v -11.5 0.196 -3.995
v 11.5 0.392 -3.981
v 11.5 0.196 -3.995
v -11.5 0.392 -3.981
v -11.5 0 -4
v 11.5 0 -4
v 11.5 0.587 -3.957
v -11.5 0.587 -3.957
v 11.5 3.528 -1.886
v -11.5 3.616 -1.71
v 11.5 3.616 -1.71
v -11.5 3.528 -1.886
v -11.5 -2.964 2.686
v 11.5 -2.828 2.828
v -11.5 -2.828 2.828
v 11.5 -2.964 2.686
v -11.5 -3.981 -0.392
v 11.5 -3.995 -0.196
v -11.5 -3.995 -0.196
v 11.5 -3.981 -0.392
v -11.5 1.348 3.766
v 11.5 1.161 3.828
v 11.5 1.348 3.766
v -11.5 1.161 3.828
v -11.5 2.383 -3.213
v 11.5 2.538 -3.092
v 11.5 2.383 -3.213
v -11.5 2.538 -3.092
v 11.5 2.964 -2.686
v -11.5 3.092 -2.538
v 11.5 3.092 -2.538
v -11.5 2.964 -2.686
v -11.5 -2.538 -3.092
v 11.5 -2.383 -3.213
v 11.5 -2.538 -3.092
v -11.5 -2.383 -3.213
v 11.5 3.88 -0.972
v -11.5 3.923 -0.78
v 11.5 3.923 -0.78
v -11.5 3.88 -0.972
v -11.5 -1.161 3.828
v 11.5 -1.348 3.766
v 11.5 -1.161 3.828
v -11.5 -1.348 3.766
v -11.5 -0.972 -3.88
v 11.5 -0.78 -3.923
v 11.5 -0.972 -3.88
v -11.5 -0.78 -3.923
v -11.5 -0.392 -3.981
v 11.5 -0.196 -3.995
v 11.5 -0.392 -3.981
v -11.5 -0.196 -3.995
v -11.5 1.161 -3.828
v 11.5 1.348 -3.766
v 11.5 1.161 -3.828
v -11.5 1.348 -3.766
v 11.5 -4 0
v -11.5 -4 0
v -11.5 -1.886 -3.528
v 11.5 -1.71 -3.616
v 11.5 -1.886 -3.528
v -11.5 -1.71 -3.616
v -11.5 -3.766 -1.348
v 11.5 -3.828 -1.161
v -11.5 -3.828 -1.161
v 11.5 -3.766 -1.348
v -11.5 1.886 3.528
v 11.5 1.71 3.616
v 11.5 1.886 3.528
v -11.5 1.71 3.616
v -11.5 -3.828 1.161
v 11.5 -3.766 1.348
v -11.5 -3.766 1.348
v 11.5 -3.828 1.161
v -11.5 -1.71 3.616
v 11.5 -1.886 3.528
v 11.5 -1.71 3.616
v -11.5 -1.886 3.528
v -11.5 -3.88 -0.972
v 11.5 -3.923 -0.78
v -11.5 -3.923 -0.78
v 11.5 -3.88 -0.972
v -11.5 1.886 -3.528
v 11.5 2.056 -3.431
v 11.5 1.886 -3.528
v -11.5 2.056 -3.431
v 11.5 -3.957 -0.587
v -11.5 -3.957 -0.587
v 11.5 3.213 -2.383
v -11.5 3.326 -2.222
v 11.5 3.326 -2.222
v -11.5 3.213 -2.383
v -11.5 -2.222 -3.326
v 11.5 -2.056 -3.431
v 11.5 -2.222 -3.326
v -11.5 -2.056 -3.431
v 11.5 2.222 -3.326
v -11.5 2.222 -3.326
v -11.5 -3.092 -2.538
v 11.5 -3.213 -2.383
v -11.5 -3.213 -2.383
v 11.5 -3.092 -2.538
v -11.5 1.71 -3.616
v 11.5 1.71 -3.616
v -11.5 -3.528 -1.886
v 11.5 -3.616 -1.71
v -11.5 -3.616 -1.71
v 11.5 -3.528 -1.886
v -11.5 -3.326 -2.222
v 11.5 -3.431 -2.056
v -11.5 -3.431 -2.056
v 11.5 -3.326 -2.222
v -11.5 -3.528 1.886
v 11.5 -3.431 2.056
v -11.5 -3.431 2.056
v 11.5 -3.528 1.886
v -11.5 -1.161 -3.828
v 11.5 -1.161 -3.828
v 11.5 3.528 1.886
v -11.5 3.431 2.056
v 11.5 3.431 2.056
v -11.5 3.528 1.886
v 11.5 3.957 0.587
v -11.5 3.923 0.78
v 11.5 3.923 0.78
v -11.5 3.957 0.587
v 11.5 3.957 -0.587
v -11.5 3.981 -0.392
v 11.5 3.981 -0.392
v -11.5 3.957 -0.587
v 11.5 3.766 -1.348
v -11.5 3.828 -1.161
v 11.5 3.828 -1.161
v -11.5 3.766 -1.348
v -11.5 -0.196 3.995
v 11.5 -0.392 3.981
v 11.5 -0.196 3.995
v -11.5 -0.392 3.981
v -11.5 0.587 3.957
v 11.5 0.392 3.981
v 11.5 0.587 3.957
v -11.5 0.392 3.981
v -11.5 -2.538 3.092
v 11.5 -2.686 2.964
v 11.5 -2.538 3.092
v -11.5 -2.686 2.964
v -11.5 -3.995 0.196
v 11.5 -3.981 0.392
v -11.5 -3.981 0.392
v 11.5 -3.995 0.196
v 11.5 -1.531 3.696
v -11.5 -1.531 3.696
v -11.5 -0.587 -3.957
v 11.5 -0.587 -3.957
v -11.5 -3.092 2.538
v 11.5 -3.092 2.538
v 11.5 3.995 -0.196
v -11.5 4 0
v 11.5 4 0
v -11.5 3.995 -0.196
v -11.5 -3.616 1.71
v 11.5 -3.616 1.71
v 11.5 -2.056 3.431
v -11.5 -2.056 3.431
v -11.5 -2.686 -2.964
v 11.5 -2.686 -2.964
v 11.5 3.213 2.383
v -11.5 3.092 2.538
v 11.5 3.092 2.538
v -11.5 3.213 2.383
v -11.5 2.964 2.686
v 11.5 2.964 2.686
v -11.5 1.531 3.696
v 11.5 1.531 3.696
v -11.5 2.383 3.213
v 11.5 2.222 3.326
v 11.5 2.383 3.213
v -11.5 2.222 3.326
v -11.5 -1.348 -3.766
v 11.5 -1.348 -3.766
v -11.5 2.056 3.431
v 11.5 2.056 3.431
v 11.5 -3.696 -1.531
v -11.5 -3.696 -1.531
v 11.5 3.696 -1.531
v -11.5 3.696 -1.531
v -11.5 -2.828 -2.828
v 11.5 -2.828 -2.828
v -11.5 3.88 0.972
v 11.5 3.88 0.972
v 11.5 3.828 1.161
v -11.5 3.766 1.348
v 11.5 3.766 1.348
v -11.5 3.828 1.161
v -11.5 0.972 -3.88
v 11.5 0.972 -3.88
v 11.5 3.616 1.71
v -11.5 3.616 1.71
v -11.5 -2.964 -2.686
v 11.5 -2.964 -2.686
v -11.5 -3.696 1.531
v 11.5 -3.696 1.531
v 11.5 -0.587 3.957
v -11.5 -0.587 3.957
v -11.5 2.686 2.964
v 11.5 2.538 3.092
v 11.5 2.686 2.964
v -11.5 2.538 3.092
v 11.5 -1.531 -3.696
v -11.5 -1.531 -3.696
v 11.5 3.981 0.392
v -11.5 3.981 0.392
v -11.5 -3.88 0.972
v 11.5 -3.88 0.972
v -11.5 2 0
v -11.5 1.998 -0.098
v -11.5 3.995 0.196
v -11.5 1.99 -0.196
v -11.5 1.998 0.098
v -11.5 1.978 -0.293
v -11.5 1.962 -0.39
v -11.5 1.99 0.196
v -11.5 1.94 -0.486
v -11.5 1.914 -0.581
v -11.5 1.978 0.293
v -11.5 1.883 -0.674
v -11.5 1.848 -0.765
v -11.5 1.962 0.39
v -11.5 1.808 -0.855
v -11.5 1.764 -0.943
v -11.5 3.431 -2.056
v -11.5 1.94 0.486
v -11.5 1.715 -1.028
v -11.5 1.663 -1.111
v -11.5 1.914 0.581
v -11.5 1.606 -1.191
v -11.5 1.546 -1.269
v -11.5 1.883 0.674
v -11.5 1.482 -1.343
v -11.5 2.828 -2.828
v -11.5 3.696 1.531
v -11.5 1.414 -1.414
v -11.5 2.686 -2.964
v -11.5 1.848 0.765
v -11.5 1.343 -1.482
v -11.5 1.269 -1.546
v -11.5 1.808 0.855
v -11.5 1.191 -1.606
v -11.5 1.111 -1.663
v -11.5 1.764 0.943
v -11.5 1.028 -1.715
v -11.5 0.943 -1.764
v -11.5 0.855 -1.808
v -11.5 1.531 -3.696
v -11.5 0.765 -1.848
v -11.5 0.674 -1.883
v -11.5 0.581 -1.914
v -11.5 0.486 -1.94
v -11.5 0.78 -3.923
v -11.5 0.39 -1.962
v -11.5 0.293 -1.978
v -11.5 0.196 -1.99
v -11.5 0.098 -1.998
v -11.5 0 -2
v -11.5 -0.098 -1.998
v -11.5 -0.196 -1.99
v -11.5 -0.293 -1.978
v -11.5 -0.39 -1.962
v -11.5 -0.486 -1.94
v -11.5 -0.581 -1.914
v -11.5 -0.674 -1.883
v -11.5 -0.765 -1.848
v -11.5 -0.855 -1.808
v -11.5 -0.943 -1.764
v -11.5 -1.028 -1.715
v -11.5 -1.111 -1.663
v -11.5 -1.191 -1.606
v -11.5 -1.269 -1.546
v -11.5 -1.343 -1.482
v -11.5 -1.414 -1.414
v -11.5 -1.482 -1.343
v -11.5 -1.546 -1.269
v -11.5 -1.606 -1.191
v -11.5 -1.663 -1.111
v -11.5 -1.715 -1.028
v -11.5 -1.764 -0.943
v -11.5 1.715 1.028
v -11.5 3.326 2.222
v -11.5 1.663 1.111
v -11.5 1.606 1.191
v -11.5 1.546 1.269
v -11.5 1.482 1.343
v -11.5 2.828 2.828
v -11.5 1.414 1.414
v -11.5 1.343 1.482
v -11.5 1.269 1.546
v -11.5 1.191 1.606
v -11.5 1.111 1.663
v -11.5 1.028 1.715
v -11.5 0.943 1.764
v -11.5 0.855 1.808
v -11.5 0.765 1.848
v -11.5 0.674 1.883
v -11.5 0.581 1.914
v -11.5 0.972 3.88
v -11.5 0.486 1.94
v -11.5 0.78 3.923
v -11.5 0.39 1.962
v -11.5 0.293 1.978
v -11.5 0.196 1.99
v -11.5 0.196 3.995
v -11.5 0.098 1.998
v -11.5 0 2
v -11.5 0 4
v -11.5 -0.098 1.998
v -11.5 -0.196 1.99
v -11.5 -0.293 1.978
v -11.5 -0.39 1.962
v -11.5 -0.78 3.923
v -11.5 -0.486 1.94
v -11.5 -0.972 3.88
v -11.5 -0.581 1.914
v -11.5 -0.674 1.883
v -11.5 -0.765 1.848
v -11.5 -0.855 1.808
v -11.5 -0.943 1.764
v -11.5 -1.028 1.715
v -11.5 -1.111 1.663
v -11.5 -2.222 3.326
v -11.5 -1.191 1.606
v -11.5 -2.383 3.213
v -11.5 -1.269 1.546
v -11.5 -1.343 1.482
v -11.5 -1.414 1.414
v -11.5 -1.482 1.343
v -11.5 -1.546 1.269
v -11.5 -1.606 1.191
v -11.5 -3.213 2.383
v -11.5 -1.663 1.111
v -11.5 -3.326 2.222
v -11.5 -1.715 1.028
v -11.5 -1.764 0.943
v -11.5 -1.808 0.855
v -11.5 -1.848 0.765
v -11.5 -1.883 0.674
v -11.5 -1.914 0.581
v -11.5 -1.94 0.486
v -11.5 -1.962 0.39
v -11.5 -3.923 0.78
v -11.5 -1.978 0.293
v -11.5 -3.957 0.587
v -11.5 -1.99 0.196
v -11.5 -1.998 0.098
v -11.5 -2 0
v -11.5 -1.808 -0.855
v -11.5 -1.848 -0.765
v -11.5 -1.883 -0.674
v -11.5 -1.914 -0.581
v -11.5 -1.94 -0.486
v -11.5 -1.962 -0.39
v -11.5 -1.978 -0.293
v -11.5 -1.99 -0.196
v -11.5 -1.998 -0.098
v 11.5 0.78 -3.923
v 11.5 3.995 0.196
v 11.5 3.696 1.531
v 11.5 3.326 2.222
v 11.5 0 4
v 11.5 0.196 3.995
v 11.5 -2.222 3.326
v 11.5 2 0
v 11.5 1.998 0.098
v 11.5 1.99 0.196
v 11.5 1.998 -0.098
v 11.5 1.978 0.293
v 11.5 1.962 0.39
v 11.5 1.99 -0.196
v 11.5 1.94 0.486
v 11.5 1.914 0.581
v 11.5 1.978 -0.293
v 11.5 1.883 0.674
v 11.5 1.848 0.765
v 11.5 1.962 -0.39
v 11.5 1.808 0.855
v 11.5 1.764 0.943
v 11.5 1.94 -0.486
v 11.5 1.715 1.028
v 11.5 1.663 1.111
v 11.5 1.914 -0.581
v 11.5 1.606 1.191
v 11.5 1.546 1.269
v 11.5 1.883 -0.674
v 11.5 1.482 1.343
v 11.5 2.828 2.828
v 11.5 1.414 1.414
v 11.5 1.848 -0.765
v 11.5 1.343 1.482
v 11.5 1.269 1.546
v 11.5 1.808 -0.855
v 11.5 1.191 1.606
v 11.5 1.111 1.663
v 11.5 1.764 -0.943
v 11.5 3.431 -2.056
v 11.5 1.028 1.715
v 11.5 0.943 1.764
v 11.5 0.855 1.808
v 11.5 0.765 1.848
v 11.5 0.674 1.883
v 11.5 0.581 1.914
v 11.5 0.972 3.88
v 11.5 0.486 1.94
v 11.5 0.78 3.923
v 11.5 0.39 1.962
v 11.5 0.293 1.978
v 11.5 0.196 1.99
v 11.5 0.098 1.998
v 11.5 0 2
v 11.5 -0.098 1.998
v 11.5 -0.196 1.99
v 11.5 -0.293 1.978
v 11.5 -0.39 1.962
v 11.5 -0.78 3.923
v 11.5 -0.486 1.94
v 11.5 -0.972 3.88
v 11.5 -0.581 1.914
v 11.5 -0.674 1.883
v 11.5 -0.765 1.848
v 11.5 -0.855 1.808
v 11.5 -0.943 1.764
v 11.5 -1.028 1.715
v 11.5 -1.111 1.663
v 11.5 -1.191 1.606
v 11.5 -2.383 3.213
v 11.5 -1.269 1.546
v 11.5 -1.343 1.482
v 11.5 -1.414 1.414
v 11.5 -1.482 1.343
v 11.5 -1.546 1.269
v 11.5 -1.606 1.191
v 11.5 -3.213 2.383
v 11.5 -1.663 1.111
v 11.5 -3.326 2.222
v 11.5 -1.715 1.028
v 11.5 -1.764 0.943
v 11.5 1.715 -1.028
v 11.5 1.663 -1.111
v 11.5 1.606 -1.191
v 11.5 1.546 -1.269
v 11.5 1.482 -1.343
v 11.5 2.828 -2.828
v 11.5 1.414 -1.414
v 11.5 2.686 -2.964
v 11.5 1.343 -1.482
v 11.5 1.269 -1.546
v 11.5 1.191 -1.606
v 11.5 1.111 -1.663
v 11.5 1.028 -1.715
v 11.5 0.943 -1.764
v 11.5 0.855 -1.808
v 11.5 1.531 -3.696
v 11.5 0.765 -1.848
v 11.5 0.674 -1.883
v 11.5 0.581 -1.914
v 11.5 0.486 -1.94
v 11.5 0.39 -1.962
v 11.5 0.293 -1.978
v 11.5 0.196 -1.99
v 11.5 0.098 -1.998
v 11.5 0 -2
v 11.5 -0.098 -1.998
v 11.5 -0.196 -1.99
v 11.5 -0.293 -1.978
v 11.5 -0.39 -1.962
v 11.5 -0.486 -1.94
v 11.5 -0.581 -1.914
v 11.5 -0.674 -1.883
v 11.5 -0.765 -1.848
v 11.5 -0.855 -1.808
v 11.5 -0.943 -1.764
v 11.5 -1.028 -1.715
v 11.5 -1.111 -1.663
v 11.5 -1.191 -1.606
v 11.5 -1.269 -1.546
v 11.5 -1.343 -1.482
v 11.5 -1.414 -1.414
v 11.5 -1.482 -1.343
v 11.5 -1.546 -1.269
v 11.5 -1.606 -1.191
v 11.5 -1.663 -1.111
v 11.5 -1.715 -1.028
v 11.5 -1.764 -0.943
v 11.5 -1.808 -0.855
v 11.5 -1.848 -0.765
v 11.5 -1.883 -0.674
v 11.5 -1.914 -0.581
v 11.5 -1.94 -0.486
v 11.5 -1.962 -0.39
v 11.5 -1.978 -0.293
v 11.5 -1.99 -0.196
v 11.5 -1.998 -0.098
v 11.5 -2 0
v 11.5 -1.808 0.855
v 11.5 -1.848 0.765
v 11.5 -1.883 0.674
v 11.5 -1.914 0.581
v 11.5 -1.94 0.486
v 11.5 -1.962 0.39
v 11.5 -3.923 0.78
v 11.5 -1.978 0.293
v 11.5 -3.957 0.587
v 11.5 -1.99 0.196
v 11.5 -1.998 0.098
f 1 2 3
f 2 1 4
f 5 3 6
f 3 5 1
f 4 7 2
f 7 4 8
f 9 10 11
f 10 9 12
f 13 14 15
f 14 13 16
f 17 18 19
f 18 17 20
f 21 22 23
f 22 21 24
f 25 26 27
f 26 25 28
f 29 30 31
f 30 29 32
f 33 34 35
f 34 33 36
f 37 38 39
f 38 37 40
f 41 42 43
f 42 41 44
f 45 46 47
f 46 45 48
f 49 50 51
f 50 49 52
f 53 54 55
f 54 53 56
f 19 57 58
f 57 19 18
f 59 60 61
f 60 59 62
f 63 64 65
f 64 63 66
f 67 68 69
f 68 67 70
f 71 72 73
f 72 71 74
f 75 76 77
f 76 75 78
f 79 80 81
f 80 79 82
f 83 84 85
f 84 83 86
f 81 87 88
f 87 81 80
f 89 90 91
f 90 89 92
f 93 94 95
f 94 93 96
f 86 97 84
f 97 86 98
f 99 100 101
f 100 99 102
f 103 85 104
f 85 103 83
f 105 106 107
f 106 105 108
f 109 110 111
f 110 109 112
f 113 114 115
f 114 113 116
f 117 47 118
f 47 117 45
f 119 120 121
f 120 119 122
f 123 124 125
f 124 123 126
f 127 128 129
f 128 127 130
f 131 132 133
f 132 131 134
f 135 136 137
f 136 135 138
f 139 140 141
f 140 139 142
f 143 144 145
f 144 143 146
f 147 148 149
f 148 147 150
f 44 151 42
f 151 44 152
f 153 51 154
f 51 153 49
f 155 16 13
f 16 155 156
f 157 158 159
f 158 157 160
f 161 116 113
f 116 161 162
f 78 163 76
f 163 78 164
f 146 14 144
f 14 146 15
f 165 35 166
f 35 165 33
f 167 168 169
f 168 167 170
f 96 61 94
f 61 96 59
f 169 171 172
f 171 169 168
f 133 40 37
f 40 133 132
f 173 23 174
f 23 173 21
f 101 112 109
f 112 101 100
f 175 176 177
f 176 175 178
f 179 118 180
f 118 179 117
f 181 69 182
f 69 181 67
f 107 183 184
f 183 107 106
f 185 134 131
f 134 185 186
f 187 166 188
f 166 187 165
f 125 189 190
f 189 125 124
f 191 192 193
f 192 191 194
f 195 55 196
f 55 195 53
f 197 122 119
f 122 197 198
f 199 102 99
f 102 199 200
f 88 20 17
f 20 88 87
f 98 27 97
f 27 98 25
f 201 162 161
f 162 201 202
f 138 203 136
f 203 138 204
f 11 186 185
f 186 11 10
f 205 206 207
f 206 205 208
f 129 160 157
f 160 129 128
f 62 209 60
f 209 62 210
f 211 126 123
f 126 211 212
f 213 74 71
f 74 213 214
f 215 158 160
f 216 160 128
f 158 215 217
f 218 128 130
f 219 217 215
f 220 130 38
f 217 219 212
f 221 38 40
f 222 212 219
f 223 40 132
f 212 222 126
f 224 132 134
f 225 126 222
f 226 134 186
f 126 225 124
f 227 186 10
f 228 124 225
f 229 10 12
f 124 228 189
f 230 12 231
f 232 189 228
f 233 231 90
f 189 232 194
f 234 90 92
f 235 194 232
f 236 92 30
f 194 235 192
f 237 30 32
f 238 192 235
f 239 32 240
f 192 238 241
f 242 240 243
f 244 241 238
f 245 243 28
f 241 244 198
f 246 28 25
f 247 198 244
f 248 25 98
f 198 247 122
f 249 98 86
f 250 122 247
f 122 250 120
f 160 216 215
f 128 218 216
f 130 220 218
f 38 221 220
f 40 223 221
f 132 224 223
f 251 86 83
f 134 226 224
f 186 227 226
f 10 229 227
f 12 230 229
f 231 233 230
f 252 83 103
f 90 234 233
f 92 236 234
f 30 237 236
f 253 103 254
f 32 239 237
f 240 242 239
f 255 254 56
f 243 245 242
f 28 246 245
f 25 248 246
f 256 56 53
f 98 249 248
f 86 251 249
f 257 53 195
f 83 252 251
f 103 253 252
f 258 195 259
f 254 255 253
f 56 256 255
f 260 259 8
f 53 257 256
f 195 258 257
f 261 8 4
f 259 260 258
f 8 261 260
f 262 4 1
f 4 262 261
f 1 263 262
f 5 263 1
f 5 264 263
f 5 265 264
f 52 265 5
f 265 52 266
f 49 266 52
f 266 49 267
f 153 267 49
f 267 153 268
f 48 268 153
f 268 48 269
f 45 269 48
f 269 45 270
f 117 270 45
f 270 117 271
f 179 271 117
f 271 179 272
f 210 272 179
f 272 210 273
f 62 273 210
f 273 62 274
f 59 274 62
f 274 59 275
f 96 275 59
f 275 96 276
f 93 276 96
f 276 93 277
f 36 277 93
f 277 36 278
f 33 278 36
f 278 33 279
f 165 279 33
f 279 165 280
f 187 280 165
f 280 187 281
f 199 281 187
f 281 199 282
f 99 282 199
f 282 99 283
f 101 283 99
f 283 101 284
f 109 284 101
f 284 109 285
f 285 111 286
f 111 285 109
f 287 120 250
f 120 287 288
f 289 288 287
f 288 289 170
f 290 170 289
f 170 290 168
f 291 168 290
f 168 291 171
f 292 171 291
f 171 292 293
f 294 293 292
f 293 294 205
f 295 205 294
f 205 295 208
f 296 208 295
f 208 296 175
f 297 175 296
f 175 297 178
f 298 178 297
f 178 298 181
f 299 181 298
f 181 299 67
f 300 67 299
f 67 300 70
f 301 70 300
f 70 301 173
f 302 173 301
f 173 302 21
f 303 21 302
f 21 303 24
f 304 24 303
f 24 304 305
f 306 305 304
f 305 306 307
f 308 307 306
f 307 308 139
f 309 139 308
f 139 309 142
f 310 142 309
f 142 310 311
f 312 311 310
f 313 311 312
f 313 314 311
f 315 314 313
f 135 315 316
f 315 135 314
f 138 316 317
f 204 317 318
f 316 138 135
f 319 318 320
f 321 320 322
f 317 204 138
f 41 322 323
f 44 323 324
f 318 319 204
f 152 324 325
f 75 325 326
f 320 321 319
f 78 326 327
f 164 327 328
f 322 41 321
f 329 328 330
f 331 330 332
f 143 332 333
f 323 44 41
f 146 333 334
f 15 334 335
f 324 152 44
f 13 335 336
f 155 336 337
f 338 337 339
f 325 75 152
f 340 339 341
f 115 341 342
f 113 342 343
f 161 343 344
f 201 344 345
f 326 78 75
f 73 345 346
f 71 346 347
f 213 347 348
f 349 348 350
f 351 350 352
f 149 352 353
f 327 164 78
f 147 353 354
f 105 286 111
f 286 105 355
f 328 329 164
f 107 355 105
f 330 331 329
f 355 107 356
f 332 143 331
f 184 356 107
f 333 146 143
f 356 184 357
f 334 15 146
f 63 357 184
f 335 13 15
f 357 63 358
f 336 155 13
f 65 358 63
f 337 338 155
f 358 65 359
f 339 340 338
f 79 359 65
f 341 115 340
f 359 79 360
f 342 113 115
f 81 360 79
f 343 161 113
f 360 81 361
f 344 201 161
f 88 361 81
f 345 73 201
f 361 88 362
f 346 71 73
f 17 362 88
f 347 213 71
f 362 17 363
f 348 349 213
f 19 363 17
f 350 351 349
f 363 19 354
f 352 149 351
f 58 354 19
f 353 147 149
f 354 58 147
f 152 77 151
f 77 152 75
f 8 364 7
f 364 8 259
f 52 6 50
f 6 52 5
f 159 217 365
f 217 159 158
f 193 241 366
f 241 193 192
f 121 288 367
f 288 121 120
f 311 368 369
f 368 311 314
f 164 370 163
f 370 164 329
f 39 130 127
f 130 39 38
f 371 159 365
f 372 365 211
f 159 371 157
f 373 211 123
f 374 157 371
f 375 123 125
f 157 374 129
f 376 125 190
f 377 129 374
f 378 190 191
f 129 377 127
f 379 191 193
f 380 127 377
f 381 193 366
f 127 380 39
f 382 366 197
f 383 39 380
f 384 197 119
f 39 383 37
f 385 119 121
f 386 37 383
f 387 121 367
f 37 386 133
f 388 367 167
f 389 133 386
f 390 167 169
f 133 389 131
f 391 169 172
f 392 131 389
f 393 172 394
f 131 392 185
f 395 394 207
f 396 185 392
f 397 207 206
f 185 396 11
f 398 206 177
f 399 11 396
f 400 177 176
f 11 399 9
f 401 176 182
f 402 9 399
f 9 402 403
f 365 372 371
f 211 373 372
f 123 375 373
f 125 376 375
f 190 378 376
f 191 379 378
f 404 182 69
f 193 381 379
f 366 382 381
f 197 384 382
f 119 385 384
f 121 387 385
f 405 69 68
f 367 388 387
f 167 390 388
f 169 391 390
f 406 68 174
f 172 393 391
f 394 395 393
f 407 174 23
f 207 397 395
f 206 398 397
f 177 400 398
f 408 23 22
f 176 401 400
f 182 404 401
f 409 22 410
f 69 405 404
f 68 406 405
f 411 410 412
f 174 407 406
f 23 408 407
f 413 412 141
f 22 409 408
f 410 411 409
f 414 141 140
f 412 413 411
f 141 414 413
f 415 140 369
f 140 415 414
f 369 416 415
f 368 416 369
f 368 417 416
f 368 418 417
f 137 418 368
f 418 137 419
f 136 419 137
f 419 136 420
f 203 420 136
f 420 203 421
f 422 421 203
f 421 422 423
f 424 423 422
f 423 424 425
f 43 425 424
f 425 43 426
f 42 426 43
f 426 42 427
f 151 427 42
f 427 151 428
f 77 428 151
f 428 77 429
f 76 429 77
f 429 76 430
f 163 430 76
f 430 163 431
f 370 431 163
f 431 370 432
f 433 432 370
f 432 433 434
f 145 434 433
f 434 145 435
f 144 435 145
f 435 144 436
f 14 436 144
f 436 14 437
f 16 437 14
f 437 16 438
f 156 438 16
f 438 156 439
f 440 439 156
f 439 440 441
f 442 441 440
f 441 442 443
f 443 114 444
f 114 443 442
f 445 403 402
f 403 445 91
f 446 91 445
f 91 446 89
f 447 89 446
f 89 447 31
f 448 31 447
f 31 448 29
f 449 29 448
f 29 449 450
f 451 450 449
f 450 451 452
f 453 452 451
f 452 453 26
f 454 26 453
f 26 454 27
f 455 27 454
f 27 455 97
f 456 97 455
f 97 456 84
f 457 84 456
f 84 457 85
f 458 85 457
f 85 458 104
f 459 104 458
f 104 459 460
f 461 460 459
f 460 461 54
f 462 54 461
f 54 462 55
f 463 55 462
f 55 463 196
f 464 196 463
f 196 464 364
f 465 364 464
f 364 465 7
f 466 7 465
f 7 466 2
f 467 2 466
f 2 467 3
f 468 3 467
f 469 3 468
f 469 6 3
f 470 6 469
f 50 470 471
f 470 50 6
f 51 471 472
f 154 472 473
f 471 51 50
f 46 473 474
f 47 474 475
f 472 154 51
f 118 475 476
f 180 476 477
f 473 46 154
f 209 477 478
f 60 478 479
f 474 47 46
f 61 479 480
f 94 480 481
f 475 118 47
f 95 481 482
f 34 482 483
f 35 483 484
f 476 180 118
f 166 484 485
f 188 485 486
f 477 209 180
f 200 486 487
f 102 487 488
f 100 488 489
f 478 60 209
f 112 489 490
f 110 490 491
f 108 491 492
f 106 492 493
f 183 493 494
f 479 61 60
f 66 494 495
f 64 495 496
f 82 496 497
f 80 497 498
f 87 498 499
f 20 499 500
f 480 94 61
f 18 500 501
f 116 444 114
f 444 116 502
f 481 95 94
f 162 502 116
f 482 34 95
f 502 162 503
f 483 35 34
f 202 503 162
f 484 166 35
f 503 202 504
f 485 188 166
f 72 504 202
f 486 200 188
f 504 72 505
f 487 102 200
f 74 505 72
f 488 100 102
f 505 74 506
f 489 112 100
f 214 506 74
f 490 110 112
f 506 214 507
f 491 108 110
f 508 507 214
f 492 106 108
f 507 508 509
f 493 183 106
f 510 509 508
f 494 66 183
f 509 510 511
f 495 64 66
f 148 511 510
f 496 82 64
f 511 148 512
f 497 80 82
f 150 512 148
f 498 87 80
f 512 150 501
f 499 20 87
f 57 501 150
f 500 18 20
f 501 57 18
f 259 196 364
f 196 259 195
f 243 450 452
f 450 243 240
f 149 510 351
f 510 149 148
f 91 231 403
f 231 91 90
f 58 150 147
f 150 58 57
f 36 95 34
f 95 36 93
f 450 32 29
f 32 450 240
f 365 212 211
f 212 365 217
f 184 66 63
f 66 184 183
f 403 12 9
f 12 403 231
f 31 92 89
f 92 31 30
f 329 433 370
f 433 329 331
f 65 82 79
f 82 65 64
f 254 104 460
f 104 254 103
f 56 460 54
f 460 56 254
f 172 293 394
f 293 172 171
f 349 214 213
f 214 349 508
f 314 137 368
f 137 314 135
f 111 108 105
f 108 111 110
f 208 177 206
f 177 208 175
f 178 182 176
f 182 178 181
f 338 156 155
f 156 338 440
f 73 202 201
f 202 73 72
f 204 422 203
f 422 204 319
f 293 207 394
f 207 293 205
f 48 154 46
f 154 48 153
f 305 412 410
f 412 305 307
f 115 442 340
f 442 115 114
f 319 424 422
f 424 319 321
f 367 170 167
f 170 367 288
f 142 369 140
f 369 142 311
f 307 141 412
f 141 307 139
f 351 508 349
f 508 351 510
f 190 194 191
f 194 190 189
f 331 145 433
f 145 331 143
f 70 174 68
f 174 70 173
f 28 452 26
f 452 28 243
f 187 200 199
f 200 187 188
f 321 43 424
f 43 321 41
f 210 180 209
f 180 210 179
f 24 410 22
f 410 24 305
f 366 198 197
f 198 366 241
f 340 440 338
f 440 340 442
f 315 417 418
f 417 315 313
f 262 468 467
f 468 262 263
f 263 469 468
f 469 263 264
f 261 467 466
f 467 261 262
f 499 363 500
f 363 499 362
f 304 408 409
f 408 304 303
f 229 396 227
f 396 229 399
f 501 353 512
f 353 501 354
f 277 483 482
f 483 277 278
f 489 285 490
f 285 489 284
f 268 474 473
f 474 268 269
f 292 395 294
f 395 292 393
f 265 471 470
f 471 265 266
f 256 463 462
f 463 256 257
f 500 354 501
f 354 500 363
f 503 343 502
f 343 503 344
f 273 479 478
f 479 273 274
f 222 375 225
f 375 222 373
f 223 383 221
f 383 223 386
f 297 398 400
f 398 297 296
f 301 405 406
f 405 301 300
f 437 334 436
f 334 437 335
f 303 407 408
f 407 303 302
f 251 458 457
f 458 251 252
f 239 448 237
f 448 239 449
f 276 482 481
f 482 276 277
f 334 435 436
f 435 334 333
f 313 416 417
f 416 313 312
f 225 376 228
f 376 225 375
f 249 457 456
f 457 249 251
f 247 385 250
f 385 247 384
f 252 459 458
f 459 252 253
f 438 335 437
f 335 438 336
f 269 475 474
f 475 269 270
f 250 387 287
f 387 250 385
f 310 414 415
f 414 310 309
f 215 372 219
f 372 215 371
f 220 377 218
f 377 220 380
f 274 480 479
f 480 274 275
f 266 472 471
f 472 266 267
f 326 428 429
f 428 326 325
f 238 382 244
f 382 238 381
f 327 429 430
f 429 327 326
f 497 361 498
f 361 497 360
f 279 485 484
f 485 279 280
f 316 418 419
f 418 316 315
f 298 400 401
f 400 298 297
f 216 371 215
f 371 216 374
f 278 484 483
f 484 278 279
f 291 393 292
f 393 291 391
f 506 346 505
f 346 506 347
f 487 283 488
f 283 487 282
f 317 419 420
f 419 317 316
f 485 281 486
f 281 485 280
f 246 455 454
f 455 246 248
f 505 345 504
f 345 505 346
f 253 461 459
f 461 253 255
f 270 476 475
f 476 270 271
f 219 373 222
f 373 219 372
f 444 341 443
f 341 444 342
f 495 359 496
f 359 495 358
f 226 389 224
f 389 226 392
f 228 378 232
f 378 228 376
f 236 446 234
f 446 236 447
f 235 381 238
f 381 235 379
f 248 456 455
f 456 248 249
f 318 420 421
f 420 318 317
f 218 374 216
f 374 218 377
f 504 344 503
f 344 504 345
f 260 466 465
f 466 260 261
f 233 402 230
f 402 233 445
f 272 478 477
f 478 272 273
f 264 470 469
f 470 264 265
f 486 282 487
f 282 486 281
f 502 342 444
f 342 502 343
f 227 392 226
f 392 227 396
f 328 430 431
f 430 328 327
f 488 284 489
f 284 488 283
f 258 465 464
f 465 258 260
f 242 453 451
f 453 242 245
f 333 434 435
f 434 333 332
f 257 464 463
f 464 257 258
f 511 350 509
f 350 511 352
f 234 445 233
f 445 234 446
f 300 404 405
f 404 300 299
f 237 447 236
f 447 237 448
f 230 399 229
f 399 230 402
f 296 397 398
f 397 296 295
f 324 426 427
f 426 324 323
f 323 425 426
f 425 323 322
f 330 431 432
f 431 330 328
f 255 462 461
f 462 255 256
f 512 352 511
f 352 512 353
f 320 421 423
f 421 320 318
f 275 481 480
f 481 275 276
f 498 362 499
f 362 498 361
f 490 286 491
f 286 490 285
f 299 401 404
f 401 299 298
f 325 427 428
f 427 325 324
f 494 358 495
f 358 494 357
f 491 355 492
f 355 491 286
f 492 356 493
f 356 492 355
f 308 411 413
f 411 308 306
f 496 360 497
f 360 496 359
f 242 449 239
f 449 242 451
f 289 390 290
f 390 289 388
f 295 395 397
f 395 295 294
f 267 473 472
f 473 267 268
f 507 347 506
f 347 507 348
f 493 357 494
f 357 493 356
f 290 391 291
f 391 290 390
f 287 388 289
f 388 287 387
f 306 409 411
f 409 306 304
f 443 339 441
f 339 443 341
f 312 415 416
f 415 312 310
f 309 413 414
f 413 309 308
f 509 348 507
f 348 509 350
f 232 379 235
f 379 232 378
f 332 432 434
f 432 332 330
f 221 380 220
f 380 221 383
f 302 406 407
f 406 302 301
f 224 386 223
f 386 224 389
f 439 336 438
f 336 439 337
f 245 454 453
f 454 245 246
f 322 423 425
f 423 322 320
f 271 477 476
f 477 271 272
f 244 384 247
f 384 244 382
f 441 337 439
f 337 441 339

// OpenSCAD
// Long linear bearing (single connected component)
// Target: 4.0mm bore, 8.0mm outer diameter, 23.0mm length

$fn = 128;

// Parameters
bore_diameter_mm  = 4.0;   //[2:8:0.1]
outer_diameter_mm = 8.0;   //[4:16:0.1]
length_mm         = 23.0;  //[12:46:0.1]

// Small overlap to ensure clean boolean operations
overlap_mm = 0.2;          //[0.05:1:0.05]

module linear_bearing() {
    // Bearing axis along X so "top/bottom" orthographic views show the through-bore
    rotate([0, 90, 0])
    difference() {
        // Outer sleeve
        cylinder(d=outer_diameter_mm, h=length_mm, center=true);

        // Through bore (slightly longer for robust subtraction)
        cylinder(d=bore_diameter_mm, h=length_mm + 2*overlap_mm, center=true);
    }
}

linear_bearing();
